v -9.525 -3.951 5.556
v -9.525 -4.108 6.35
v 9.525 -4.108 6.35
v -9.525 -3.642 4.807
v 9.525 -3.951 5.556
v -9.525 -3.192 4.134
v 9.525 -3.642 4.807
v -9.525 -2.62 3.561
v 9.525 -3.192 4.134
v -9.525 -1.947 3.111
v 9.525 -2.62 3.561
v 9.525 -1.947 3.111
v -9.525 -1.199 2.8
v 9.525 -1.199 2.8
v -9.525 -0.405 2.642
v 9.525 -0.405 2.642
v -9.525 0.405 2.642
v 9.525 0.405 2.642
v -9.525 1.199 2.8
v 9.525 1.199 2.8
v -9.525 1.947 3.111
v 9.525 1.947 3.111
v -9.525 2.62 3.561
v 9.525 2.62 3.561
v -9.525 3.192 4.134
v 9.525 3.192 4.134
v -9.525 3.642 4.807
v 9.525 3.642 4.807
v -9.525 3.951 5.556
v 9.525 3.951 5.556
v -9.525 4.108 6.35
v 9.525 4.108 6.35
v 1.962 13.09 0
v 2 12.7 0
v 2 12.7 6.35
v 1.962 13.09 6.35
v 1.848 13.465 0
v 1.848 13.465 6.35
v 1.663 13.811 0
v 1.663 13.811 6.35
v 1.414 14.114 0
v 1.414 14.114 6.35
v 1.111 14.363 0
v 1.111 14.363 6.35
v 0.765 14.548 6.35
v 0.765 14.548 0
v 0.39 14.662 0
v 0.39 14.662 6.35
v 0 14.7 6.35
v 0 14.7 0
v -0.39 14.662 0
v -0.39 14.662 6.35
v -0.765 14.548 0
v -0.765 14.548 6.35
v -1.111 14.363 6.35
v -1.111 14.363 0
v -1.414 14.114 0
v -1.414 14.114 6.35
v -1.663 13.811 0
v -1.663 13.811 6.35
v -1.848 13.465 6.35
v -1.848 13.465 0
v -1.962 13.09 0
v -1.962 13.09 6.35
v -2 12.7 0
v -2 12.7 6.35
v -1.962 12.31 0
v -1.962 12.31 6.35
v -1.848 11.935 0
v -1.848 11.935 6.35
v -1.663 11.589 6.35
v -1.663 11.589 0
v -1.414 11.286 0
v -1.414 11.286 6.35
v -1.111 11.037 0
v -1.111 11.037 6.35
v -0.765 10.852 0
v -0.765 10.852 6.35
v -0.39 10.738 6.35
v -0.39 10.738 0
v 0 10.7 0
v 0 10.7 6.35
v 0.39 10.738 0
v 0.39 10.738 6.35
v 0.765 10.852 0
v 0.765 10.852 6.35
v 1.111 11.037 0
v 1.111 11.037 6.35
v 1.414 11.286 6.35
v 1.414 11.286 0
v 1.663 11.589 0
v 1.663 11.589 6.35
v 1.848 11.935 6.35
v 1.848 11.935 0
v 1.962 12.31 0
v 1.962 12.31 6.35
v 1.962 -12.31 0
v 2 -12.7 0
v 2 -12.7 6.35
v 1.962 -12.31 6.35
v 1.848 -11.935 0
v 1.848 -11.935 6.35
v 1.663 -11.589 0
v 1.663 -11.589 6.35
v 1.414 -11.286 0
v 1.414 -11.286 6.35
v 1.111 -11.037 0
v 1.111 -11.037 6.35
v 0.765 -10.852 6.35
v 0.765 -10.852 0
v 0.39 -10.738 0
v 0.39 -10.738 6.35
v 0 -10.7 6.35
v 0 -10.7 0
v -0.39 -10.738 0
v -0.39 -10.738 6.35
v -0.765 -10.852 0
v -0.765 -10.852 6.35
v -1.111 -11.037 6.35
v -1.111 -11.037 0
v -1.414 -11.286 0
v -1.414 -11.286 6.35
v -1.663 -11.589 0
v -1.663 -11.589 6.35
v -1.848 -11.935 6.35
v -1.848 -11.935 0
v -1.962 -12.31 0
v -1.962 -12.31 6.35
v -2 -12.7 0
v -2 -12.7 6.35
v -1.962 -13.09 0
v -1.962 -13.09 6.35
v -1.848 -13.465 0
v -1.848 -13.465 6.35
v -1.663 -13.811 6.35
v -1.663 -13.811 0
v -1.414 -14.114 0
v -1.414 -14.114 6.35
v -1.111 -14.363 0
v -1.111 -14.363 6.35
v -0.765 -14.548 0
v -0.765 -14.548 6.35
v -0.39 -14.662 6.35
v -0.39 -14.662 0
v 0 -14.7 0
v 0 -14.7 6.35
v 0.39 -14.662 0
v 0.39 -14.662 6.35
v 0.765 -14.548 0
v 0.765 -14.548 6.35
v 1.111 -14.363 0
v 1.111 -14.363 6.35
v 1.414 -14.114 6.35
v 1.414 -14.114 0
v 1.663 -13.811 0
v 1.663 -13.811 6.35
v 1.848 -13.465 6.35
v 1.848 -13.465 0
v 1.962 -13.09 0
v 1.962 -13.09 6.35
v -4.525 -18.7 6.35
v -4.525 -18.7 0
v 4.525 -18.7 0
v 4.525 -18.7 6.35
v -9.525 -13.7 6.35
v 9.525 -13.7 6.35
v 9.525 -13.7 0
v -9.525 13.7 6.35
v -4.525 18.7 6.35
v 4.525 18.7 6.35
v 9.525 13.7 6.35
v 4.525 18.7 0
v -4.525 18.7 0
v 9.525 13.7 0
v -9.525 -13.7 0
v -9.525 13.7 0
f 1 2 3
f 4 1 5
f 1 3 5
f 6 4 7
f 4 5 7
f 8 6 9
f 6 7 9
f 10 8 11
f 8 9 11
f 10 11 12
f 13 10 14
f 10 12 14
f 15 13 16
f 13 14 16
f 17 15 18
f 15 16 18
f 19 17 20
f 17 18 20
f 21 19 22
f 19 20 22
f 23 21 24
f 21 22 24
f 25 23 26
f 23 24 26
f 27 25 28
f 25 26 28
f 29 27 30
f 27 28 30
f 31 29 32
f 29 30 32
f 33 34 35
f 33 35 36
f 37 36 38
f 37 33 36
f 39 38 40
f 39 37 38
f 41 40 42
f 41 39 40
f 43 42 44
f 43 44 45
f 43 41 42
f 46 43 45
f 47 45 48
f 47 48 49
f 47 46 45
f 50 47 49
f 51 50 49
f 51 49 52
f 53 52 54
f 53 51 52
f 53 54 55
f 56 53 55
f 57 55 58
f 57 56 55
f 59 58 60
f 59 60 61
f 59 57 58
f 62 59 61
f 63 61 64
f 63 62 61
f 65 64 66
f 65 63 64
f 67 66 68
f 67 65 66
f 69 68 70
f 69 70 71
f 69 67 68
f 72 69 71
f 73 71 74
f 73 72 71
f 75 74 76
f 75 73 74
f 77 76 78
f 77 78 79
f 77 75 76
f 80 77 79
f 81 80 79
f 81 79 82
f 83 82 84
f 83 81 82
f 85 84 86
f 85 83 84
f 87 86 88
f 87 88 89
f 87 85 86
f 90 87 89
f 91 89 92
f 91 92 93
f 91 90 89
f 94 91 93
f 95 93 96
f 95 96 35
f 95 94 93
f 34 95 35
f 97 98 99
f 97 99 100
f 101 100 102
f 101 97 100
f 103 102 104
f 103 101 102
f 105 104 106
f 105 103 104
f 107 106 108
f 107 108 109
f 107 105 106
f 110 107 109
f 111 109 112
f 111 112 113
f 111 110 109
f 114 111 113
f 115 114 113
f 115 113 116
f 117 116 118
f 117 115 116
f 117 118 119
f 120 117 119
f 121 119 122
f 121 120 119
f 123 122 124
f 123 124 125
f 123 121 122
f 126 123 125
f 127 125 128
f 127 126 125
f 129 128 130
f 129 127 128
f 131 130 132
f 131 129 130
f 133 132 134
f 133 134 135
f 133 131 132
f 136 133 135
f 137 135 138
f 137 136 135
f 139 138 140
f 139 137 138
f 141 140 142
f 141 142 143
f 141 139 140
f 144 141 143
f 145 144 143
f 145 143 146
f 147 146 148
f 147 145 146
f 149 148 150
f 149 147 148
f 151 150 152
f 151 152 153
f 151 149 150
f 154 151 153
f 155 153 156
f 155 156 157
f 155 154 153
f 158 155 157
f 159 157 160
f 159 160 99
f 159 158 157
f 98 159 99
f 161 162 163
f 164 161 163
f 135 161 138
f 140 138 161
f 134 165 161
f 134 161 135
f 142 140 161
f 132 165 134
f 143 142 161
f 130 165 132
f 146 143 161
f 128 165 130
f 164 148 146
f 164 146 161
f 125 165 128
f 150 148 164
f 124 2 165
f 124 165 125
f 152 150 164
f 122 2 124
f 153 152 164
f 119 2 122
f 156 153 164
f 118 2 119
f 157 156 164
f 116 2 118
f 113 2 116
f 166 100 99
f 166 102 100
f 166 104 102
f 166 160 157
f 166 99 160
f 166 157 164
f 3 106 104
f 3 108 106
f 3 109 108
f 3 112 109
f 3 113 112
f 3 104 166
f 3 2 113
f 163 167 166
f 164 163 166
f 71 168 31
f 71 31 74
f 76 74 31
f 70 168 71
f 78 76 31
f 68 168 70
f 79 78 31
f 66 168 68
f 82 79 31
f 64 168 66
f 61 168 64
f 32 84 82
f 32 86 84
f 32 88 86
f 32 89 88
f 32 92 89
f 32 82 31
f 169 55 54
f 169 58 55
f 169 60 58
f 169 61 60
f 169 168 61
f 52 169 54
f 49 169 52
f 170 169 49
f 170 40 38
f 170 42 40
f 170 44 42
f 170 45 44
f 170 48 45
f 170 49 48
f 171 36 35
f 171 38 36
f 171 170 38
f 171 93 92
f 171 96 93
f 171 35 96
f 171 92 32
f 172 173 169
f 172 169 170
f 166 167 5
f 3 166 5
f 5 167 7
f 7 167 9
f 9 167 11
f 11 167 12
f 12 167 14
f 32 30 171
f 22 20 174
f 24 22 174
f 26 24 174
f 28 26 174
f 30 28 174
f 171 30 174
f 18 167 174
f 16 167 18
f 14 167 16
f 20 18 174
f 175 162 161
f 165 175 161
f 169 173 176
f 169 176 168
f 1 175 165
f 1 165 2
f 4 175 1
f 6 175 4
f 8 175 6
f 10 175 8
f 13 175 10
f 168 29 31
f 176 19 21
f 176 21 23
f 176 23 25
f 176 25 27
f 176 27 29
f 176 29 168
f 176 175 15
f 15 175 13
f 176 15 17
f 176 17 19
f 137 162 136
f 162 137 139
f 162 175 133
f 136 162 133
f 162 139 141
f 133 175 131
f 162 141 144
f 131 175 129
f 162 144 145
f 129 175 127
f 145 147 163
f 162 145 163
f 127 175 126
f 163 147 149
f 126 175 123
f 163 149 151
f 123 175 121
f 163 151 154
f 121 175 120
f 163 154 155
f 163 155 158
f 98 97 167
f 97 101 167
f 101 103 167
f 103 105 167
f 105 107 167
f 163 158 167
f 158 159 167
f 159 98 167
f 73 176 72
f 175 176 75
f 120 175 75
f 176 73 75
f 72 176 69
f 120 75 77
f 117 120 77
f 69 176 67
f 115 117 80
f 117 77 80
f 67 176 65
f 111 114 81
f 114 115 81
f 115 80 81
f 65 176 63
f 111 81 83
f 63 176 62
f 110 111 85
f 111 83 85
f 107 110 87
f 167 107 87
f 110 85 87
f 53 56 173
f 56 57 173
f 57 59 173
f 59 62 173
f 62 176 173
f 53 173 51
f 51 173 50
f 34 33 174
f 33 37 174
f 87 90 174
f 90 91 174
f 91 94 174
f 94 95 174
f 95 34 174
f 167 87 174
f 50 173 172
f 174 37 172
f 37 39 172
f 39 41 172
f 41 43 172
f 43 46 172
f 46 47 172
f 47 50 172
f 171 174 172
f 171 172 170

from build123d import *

# Parameters (mm, degrees)
F0_W     = 19.05
F0_H     = 37.4
F0_R     = 2
F1_DEPTH = 6.35
F2_R     = 4.1275
F3_DEPTH = 100
F4_SIZE  = 5


with BuildPart() as f1:
    # F0 (on Top) → F1 (new body)
    with BuildSketch(Plane.XY):
        Rectangle(F0_W, F0_H)
        with Locations((0, -12.7)):
            Circle(F0_R, mode=Mode.SUBTRACT)
        with Locations((0, 12.7)):
            Circle(F0_R, mode=Mode.SUBTRACT)
    extrude(amount=F1_DEPTH)

    # F2 (on face) → F3 (cut)
    with BuildSketch(Plane.YZ.offset(9.525)):
        with Locations((0, 6.75)):
            Circle(F2_R)
    extrude(amount=-F3_DEPTH, mode=Mode.SUBTRACT)

    # F4
    f4_edges = [f1.edges().sort_by_distance(p)[0] for p in [
        (9.525, -18.7, 3.175),
        (-9.525, -18.7, 3.175),
        (-9.525, 18.7, 3.175),
        (9.525, 18.7, 3.175),
    ]]
    chamfer(f4_edges, length=F4_SIZE)


solid = f1.part
